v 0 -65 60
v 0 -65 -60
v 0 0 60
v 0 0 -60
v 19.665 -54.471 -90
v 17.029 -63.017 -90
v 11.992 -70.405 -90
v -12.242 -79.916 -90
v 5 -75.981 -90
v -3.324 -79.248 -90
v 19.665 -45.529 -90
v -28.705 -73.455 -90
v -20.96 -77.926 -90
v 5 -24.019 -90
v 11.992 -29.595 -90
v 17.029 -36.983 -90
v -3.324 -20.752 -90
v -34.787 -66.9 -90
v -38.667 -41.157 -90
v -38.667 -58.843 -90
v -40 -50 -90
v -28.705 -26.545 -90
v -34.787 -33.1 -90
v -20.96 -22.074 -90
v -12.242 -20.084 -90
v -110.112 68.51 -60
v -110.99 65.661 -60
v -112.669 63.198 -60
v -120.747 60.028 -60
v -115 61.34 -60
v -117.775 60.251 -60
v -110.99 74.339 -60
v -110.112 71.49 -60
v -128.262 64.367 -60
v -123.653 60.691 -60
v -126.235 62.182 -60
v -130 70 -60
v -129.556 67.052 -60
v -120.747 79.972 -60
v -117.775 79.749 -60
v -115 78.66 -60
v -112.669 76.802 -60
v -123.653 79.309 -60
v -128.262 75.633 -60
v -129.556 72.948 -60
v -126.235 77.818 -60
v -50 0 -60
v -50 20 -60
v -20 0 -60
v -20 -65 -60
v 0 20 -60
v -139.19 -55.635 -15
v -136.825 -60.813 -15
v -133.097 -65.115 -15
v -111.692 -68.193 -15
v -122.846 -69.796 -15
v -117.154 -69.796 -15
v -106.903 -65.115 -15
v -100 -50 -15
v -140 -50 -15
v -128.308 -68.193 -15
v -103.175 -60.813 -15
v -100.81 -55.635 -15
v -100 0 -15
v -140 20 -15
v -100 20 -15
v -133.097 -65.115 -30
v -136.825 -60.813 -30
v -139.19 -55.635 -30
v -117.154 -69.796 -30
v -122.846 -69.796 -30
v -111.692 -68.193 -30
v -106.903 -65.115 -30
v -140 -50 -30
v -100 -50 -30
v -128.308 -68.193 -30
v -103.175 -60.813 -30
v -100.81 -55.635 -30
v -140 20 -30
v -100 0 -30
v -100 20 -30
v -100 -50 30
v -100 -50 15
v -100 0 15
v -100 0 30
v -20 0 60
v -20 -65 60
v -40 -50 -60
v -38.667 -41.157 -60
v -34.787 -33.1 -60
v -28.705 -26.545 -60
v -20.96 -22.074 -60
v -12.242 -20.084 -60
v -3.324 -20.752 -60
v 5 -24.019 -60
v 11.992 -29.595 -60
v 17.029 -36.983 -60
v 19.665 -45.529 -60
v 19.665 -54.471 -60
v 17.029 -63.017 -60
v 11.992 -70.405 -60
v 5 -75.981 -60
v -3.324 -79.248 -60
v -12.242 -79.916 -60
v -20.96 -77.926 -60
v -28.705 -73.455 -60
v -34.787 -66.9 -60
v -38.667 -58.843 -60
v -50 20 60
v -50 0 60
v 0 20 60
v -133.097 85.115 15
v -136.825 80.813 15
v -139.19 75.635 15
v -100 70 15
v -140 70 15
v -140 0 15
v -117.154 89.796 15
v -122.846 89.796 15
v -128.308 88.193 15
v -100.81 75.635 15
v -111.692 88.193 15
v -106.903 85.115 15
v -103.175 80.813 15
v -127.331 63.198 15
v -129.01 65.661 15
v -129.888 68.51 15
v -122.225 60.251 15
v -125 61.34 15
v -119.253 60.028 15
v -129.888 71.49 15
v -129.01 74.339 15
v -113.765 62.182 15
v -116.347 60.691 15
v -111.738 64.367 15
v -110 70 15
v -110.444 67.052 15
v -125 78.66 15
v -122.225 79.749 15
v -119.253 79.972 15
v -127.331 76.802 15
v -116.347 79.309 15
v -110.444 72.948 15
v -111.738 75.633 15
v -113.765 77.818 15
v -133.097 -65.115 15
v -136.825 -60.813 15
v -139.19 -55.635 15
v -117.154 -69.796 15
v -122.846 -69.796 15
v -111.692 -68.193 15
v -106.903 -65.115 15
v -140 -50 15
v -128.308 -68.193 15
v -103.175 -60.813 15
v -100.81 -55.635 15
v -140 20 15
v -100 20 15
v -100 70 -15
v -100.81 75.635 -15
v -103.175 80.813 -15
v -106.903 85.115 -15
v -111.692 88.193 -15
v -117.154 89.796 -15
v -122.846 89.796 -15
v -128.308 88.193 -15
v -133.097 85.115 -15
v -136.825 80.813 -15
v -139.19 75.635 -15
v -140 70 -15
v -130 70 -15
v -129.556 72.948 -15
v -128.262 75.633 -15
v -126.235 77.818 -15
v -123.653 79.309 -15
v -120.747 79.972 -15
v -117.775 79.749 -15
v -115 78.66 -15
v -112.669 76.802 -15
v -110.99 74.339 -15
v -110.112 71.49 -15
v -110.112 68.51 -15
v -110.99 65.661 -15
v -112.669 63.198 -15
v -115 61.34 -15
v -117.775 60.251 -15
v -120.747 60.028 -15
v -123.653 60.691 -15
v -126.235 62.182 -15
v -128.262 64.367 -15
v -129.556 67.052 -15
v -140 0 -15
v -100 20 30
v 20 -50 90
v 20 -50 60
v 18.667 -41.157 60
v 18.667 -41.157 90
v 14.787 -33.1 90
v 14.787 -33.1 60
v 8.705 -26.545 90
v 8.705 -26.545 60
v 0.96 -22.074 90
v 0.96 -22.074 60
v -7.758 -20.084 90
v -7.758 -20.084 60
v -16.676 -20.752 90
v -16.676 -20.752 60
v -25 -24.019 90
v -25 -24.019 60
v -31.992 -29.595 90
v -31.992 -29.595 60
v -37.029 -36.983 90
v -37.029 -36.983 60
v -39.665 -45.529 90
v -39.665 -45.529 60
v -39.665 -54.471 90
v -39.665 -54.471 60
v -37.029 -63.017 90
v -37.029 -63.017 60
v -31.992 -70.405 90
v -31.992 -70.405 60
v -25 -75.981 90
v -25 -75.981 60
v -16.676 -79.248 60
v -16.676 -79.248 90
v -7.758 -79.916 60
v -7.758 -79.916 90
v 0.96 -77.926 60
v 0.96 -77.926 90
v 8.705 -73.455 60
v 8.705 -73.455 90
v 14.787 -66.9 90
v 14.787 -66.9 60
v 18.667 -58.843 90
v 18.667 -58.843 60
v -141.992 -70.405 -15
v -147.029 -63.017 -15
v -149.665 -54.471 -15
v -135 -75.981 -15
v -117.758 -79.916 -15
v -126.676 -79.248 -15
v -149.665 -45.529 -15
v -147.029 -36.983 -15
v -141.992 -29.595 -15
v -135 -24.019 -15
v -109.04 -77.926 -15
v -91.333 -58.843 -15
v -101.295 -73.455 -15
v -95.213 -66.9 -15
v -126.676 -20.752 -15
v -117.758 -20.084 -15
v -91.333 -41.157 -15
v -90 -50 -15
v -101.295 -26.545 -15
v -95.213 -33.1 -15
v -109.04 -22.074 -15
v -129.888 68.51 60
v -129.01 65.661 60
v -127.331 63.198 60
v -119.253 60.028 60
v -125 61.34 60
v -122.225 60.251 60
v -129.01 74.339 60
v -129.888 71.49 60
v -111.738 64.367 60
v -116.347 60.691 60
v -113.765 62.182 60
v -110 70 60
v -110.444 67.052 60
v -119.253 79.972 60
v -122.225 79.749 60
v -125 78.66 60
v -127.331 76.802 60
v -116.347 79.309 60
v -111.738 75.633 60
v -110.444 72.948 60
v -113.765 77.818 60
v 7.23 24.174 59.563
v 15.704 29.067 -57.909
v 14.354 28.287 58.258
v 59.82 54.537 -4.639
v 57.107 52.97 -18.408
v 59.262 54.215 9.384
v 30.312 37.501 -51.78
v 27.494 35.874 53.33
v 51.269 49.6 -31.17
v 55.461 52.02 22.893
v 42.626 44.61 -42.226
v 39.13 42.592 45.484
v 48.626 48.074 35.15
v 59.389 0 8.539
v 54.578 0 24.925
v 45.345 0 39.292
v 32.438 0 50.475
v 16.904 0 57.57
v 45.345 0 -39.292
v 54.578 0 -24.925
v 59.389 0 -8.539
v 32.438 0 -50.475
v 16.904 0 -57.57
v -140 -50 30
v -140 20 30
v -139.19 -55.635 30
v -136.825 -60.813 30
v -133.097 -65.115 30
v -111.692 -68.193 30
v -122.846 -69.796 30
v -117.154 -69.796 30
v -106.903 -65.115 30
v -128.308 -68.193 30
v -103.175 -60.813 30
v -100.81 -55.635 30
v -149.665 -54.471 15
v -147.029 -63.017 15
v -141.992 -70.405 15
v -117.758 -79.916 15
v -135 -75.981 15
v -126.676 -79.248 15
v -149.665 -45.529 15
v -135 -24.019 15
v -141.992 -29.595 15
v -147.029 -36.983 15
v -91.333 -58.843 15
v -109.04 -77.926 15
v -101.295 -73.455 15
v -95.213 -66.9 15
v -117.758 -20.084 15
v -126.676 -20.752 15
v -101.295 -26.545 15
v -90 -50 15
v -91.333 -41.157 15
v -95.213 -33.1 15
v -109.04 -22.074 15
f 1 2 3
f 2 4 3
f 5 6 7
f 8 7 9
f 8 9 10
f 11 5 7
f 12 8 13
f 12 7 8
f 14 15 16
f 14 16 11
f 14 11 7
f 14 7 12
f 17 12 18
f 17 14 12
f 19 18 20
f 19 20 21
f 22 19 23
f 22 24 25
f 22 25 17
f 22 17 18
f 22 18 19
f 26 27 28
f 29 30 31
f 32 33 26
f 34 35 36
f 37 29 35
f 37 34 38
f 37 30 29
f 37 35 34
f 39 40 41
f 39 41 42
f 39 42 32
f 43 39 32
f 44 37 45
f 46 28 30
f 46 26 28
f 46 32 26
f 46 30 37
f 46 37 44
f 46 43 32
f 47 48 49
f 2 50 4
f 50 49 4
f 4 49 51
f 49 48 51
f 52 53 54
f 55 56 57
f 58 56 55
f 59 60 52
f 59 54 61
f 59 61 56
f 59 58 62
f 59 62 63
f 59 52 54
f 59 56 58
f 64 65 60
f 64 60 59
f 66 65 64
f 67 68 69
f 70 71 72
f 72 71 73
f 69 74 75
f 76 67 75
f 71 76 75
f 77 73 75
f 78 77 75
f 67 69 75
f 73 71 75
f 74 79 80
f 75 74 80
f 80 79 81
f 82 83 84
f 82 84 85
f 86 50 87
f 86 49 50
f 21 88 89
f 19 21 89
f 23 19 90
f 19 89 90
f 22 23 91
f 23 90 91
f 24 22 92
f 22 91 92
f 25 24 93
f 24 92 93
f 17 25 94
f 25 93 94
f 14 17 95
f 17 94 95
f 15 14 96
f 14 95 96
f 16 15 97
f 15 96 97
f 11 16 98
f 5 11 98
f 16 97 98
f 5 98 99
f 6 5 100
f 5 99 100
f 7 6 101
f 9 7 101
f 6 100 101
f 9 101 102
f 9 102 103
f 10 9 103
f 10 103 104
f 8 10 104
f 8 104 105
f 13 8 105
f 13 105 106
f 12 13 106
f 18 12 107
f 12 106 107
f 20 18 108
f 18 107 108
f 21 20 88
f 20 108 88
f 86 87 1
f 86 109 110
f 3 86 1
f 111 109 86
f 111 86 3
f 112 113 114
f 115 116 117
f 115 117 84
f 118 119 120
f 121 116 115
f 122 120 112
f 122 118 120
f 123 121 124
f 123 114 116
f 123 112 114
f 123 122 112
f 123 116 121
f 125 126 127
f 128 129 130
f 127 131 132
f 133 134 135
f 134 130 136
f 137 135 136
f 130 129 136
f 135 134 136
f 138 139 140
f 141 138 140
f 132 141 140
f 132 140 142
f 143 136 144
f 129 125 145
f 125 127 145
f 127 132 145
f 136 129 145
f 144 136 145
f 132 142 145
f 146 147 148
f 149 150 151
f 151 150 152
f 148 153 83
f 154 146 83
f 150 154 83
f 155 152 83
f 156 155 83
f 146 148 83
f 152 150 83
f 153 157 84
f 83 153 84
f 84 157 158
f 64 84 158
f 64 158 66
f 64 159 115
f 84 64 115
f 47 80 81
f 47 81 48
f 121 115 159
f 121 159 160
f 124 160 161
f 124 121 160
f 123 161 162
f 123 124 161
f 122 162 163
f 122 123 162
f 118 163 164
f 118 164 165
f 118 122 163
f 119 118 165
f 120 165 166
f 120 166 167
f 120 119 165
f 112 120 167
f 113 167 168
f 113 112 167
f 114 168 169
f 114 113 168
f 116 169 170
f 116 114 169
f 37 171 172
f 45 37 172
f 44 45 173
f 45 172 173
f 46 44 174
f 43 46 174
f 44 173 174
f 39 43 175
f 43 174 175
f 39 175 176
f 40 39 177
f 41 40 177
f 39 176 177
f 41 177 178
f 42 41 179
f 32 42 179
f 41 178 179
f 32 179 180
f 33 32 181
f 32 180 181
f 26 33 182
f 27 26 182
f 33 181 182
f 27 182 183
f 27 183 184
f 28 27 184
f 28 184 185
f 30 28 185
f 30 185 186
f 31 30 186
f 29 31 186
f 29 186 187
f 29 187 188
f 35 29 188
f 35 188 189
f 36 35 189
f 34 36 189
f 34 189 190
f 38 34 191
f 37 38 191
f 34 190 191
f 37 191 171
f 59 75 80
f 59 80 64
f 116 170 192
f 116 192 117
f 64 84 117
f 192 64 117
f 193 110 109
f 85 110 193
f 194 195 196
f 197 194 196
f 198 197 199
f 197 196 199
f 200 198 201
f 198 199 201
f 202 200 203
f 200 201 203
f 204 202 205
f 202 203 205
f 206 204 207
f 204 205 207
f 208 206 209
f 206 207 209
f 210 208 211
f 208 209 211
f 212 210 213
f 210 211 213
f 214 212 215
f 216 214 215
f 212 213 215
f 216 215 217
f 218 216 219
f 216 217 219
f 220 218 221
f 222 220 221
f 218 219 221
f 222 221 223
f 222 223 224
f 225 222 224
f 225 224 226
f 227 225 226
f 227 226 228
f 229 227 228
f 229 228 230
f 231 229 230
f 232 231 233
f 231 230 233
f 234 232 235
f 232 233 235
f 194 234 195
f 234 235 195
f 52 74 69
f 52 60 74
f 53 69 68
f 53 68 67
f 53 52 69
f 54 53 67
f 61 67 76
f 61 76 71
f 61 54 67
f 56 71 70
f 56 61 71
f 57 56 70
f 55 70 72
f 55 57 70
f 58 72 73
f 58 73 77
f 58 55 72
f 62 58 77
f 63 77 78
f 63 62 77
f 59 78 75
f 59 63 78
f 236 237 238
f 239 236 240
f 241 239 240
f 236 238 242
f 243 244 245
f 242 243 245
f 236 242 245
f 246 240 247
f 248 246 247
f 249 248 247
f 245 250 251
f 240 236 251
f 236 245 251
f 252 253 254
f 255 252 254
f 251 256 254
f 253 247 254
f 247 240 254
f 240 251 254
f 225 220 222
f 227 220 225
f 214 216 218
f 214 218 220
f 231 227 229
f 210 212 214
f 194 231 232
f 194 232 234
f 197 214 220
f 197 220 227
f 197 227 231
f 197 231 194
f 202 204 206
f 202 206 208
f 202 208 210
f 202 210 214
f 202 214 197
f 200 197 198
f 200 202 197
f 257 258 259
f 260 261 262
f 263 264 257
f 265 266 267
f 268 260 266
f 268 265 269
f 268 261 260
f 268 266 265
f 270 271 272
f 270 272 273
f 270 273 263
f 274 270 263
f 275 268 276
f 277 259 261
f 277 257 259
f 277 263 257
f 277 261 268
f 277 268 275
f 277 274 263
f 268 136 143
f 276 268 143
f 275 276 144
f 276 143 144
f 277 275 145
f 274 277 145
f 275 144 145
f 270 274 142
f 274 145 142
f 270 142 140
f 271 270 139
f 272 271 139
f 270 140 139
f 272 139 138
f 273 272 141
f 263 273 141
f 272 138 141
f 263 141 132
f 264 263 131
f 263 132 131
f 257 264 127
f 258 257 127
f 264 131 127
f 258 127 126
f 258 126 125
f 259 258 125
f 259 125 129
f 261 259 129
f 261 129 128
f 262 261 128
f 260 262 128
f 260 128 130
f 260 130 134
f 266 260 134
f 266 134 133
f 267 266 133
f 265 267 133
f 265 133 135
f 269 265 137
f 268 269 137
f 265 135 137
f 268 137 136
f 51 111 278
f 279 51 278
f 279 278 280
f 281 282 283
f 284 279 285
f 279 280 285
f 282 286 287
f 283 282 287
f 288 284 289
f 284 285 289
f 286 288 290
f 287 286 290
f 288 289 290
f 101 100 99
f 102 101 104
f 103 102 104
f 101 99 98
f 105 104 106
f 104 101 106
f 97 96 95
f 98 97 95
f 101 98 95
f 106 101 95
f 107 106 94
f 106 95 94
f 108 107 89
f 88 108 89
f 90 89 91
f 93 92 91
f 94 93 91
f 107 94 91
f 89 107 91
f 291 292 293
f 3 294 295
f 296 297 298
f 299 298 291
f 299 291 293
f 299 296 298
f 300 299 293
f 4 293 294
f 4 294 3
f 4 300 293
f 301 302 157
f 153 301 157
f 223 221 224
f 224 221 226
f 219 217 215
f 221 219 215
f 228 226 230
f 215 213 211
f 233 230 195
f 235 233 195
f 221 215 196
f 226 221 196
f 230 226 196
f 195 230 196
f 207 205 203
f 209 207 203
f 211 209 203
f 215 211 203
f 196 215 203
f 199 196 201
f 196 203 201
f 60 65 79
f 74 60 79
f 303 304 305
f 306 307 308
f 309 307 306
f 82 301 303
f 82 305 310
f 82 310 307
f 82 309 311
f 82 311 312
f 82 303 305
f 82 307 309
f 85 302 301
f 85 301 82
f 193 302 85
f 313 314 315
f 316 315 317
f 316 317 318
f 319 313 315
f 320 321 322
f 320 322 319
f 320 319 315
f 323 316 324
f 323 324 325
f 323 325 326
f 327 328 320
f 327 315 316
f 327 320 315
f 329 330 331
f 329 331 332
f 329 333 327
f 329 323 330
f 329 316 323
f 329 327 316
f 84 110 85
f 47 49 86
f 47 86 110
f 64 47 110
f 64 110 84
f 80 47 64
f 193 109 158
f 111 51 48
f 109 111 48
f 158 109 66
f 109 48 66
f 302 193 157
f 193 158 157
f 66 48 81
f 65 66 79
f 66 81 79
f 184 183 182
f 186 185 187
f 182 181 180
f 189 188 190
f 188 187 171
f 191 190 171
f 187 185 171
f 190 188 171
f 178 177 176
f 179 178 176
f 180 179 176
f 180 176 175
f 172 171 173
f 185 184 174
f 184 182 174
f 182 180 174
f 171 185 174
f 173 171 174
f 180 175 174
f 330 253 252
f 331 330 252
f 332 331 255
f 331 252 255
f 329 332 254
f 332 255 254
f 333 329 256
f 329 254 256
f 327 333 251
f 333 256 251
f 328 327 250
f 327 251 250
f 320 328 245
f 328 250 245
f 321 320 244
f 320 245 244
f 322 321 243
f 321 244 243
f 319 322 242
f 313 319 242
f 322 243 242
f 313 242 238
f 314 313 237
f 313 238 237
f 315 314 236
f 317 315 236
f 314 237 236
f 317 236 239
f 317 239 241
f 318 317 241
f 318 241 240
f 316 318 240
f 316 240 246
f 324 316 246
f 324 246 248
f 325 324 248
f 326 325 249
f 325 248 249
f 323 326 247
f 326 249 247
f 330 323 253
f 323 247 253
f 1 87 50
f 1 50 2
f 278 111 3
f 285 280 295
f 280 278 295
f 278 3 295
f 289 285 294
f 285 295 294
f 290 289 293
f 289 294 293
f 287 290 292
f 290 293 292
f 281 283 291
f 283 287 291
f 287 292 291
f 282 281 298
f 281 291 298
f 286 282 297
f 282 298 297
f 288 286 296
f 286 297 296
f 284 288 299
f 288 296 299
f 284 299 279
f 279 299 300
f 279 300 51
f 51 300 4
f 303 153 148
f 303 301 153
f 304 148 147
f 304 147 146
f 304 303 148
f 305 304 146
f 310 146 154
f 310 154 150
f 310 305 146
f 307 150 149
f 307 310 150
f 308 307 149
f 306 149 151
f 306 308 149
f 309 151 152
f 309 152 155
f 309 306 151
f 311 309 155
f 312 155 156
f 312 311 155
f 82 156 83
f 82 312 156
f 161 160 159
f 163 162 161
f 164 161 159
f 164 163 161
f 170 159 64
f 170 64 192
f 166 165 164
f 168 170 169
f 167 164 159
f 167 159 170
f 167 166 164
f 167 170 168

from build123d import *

# Parameters (mm, degrees)
EXTRUDE1_DEPTH       = 20
EXTRUDE2_DEPTH       = 40
CUT_EXTRUDE1_DEPTH   = 60
SKETCH5_W            = 20
SKETCH5_H            = 120
SKETCH5_W_2          = 40
SKETCH5_H_2          = 15
EXTRUDE3_DEPTH       = 50
SKETCH6_W            = 20
SKETCH6_H            = 120
EXTRUDE4_DEPTH       = 15
SKETCH7_R            = 20
EXTRUDE5_DEPTH       = 15
SKETCH8_R            = 20
EXTRUDE6_DEPTH       = 15
SKETCH9_R            = 30
EXTRUDE7_DEPTH       = 30
SKETCH10_R           = 30
EXTRUDE8_DEPTH       = 30
SKETCH12_R           = 30
EXTRUDE9_DEPTH       = 30
SKETCH13_W           = 40
SKETCH13_H           = 30
EXTRUDE10_DEPTH      = 50
EXTRUDE10_DEPTH_BACK = 20
SKETCH14_R           = 20
EXTRUDE12_DEPTH      = 30
SKETCH15_R           = 10
EXTRUDE13_DEPTH      = 45
SKETCH16_R           = 10
EXTRUDE14_DEPTH      = 45


with BuildPart() as part:
    # Sketch1 → Extrude1 (new body)
    with BuildSketch(Plane(origin=(0, 0, 0), x_dir=(1, 0, 0), z_dir=(0, 1, 0))):
        with BuildLine():
            Line((0, -60), (-50, -60))
            Line((-50, -60), (-100, -30))
            Line((-100, -30), (-140, -30))
            Line((-140, -30), (-140, -15))
            Line((-140, -15), (-100, -15))
            Line((-100, -15), (-100, 15))
            Line((-100, 15), (-140, 15))
            Line((-140, 15), (-140, 30))
            Line((-140, 30), (-100, 30))
            Line((-100, 30), (-50, 60))
            Line((-50, 60), (0, 60))
            ThreePointArc((0, 60), (60, 0), (0, -60))
        make_face()
    extrude(amount=EXTRUDE1_DEPTH)

    # Sketch2 → Extrude2 (add)
    with BuildSketch(Plane(origin=(0, 20, 0), x_dir=(-1, 0, 0), z_dir=(0, 1, 0))):
        with BuildLine():
            Line((0, -60), (0, 60))
            ThreePointArc((0, 60), (-60, 0), (0, -60))
        make_face()
    extrude(amount=EXTRUDE2_DEPTH)

    # Sketch4 → Cut-Extrude1 (cut, symmetric)
    with BuildSketch(Plane.XY):
        Polygon((0, 20), (76.102453908, 63.93777225), (55, 100.488294582), (-21.102453908, 56.550522332), align=None)
    extrude(amount=CUT_EXTRUDE1_DEPTH, both=True, mode=Mode.SUBTRACT)

    # Sketch5 → Extrude3 (add)
    with BuildSketch(Plane.XZ):
        with Locations((-10, 0)):
            Rectangle(SKETCH5_W, SKETCH5_H)
        with Locations((-120, 22.5)):
            Rectangle(SKETCH5_W_2, SKETCH5_H_2)
        with Locations((-120, -22.5)):
            Rectangle(SKETCH5_W_2, SKETCH5_H_2)
    extrude(amount=EXTRUDE3_DEPTH)

    # Sketch6 → Extrude4 (add)
    with BuildSketch(Plane.XZ.offset(50)):
        with Locations((-10, 0)):
            Rectangle(SKETCH6_W, SKETCH6_H)
    extrude(amount=EXTRUDE4_DEPTH)

    # Sketch7 → Extrude5 (add)
    with BuildSketch(Plane.XY.offset(30)):
        with Locations((-120, -50)):
            Circle(SKETCH7_R)
    extrude(amount=-EXTRUDE5_DEPTH)

    # Sketch8 → Extrude6 (add)
    with BuildSketch(Plane.XY.offset(-15)):
        with Locations((-120, -50)):
            Circle(SKETCH8_R)
    extrude(amount=-EXTRUDE6_DEPTH)


with BuildPart() as body_2:
    # Sketch9 → Extrude7 (new body)
    with BuildSketch(Plane.XY.offset(60)):
        with Locations((-10, -50)):
            Circle(SKETCH9_R)
    extrude(amount=EXTRUDE7_DEPTH)


with BuildPart() as body_3:
    # Sketch10 → Extrude8 (new body)
    with BuildSketch(Plane(origin=(0, 0, -60), x_dir=(-1, 0, 0), z_dir=(0, 0, -1))):
        with Locations((10, -50)):
            Circle(SKETCH10_R)
    extrude(amount=EXTRUDE8_DEPTH)


with BuildPart() as body_4:
    # Sketch12 → Extrude9 (new body)
    with BuildSketch(Plane.XY.offset(-15)):
        with Locations((-120, -50)):
            Circle(SKETCH12_R)
    extrude(amount=EXTRUDE9_DEPTH)


with BuildPart() as body_5:
    # Sketch13 → Extrude10 (new body, two sides)
    with BuildSketch(Plane(origin=(0, 20, 0), x_dir=(-1, 0, 0), z_dir=(0, 1, 0))) as extrude10_sk:
        with Locations((120, 0)):
            Rectangle(SKETCH13_W, SKETCH13_H)
    extrude(amount=EXTRUDE10_DEPTH)
    extrude(extrude10_sk.sketch, amount=-EXTRUDE10_DEPTH_BACK)


with BuildPart() as body_6:
    # Sketch14 → Extrude12 (new body)
    with BuildSketch(Plane.XY.offset(15)):
        with Locations((-120, 70)):
            Circle(SKETCH14_R)
    extrude(amount=-EXTRUDE12_DEPTH)


with BuildPart() as body_5_1:
    add(body_5.part)

    # Combine1: union body 6
    add(body_6.part)


with BuildPart() as body_6_2:
    # Sketch15 → Extrude13 (new body)
    with BuildSketch(Plane.XY.offset(15)):
        with Locations((-120, 70)):
            Circle(SKETCH15_R)
    extrude(amount=EXTRUDE13_DEPTH)


with BuildPart() as body_7:
    # Sketch16 → Extrude14 (new body)
    with BuildSketch(Plane(origin=(0, 0, -15), x_dir=(-1, 0, 0), z_dir=(0, 0, -1))):
        with Locations((120, 70)):
            Circle(SKETCH16_R)
    extrude(amount=EXTRUDE14_DEPTH)


solid = Compound([part.part, body_2.part, body_3.part, body_4.part, body_5_1.part, body_6_2.part, body_7.part])
